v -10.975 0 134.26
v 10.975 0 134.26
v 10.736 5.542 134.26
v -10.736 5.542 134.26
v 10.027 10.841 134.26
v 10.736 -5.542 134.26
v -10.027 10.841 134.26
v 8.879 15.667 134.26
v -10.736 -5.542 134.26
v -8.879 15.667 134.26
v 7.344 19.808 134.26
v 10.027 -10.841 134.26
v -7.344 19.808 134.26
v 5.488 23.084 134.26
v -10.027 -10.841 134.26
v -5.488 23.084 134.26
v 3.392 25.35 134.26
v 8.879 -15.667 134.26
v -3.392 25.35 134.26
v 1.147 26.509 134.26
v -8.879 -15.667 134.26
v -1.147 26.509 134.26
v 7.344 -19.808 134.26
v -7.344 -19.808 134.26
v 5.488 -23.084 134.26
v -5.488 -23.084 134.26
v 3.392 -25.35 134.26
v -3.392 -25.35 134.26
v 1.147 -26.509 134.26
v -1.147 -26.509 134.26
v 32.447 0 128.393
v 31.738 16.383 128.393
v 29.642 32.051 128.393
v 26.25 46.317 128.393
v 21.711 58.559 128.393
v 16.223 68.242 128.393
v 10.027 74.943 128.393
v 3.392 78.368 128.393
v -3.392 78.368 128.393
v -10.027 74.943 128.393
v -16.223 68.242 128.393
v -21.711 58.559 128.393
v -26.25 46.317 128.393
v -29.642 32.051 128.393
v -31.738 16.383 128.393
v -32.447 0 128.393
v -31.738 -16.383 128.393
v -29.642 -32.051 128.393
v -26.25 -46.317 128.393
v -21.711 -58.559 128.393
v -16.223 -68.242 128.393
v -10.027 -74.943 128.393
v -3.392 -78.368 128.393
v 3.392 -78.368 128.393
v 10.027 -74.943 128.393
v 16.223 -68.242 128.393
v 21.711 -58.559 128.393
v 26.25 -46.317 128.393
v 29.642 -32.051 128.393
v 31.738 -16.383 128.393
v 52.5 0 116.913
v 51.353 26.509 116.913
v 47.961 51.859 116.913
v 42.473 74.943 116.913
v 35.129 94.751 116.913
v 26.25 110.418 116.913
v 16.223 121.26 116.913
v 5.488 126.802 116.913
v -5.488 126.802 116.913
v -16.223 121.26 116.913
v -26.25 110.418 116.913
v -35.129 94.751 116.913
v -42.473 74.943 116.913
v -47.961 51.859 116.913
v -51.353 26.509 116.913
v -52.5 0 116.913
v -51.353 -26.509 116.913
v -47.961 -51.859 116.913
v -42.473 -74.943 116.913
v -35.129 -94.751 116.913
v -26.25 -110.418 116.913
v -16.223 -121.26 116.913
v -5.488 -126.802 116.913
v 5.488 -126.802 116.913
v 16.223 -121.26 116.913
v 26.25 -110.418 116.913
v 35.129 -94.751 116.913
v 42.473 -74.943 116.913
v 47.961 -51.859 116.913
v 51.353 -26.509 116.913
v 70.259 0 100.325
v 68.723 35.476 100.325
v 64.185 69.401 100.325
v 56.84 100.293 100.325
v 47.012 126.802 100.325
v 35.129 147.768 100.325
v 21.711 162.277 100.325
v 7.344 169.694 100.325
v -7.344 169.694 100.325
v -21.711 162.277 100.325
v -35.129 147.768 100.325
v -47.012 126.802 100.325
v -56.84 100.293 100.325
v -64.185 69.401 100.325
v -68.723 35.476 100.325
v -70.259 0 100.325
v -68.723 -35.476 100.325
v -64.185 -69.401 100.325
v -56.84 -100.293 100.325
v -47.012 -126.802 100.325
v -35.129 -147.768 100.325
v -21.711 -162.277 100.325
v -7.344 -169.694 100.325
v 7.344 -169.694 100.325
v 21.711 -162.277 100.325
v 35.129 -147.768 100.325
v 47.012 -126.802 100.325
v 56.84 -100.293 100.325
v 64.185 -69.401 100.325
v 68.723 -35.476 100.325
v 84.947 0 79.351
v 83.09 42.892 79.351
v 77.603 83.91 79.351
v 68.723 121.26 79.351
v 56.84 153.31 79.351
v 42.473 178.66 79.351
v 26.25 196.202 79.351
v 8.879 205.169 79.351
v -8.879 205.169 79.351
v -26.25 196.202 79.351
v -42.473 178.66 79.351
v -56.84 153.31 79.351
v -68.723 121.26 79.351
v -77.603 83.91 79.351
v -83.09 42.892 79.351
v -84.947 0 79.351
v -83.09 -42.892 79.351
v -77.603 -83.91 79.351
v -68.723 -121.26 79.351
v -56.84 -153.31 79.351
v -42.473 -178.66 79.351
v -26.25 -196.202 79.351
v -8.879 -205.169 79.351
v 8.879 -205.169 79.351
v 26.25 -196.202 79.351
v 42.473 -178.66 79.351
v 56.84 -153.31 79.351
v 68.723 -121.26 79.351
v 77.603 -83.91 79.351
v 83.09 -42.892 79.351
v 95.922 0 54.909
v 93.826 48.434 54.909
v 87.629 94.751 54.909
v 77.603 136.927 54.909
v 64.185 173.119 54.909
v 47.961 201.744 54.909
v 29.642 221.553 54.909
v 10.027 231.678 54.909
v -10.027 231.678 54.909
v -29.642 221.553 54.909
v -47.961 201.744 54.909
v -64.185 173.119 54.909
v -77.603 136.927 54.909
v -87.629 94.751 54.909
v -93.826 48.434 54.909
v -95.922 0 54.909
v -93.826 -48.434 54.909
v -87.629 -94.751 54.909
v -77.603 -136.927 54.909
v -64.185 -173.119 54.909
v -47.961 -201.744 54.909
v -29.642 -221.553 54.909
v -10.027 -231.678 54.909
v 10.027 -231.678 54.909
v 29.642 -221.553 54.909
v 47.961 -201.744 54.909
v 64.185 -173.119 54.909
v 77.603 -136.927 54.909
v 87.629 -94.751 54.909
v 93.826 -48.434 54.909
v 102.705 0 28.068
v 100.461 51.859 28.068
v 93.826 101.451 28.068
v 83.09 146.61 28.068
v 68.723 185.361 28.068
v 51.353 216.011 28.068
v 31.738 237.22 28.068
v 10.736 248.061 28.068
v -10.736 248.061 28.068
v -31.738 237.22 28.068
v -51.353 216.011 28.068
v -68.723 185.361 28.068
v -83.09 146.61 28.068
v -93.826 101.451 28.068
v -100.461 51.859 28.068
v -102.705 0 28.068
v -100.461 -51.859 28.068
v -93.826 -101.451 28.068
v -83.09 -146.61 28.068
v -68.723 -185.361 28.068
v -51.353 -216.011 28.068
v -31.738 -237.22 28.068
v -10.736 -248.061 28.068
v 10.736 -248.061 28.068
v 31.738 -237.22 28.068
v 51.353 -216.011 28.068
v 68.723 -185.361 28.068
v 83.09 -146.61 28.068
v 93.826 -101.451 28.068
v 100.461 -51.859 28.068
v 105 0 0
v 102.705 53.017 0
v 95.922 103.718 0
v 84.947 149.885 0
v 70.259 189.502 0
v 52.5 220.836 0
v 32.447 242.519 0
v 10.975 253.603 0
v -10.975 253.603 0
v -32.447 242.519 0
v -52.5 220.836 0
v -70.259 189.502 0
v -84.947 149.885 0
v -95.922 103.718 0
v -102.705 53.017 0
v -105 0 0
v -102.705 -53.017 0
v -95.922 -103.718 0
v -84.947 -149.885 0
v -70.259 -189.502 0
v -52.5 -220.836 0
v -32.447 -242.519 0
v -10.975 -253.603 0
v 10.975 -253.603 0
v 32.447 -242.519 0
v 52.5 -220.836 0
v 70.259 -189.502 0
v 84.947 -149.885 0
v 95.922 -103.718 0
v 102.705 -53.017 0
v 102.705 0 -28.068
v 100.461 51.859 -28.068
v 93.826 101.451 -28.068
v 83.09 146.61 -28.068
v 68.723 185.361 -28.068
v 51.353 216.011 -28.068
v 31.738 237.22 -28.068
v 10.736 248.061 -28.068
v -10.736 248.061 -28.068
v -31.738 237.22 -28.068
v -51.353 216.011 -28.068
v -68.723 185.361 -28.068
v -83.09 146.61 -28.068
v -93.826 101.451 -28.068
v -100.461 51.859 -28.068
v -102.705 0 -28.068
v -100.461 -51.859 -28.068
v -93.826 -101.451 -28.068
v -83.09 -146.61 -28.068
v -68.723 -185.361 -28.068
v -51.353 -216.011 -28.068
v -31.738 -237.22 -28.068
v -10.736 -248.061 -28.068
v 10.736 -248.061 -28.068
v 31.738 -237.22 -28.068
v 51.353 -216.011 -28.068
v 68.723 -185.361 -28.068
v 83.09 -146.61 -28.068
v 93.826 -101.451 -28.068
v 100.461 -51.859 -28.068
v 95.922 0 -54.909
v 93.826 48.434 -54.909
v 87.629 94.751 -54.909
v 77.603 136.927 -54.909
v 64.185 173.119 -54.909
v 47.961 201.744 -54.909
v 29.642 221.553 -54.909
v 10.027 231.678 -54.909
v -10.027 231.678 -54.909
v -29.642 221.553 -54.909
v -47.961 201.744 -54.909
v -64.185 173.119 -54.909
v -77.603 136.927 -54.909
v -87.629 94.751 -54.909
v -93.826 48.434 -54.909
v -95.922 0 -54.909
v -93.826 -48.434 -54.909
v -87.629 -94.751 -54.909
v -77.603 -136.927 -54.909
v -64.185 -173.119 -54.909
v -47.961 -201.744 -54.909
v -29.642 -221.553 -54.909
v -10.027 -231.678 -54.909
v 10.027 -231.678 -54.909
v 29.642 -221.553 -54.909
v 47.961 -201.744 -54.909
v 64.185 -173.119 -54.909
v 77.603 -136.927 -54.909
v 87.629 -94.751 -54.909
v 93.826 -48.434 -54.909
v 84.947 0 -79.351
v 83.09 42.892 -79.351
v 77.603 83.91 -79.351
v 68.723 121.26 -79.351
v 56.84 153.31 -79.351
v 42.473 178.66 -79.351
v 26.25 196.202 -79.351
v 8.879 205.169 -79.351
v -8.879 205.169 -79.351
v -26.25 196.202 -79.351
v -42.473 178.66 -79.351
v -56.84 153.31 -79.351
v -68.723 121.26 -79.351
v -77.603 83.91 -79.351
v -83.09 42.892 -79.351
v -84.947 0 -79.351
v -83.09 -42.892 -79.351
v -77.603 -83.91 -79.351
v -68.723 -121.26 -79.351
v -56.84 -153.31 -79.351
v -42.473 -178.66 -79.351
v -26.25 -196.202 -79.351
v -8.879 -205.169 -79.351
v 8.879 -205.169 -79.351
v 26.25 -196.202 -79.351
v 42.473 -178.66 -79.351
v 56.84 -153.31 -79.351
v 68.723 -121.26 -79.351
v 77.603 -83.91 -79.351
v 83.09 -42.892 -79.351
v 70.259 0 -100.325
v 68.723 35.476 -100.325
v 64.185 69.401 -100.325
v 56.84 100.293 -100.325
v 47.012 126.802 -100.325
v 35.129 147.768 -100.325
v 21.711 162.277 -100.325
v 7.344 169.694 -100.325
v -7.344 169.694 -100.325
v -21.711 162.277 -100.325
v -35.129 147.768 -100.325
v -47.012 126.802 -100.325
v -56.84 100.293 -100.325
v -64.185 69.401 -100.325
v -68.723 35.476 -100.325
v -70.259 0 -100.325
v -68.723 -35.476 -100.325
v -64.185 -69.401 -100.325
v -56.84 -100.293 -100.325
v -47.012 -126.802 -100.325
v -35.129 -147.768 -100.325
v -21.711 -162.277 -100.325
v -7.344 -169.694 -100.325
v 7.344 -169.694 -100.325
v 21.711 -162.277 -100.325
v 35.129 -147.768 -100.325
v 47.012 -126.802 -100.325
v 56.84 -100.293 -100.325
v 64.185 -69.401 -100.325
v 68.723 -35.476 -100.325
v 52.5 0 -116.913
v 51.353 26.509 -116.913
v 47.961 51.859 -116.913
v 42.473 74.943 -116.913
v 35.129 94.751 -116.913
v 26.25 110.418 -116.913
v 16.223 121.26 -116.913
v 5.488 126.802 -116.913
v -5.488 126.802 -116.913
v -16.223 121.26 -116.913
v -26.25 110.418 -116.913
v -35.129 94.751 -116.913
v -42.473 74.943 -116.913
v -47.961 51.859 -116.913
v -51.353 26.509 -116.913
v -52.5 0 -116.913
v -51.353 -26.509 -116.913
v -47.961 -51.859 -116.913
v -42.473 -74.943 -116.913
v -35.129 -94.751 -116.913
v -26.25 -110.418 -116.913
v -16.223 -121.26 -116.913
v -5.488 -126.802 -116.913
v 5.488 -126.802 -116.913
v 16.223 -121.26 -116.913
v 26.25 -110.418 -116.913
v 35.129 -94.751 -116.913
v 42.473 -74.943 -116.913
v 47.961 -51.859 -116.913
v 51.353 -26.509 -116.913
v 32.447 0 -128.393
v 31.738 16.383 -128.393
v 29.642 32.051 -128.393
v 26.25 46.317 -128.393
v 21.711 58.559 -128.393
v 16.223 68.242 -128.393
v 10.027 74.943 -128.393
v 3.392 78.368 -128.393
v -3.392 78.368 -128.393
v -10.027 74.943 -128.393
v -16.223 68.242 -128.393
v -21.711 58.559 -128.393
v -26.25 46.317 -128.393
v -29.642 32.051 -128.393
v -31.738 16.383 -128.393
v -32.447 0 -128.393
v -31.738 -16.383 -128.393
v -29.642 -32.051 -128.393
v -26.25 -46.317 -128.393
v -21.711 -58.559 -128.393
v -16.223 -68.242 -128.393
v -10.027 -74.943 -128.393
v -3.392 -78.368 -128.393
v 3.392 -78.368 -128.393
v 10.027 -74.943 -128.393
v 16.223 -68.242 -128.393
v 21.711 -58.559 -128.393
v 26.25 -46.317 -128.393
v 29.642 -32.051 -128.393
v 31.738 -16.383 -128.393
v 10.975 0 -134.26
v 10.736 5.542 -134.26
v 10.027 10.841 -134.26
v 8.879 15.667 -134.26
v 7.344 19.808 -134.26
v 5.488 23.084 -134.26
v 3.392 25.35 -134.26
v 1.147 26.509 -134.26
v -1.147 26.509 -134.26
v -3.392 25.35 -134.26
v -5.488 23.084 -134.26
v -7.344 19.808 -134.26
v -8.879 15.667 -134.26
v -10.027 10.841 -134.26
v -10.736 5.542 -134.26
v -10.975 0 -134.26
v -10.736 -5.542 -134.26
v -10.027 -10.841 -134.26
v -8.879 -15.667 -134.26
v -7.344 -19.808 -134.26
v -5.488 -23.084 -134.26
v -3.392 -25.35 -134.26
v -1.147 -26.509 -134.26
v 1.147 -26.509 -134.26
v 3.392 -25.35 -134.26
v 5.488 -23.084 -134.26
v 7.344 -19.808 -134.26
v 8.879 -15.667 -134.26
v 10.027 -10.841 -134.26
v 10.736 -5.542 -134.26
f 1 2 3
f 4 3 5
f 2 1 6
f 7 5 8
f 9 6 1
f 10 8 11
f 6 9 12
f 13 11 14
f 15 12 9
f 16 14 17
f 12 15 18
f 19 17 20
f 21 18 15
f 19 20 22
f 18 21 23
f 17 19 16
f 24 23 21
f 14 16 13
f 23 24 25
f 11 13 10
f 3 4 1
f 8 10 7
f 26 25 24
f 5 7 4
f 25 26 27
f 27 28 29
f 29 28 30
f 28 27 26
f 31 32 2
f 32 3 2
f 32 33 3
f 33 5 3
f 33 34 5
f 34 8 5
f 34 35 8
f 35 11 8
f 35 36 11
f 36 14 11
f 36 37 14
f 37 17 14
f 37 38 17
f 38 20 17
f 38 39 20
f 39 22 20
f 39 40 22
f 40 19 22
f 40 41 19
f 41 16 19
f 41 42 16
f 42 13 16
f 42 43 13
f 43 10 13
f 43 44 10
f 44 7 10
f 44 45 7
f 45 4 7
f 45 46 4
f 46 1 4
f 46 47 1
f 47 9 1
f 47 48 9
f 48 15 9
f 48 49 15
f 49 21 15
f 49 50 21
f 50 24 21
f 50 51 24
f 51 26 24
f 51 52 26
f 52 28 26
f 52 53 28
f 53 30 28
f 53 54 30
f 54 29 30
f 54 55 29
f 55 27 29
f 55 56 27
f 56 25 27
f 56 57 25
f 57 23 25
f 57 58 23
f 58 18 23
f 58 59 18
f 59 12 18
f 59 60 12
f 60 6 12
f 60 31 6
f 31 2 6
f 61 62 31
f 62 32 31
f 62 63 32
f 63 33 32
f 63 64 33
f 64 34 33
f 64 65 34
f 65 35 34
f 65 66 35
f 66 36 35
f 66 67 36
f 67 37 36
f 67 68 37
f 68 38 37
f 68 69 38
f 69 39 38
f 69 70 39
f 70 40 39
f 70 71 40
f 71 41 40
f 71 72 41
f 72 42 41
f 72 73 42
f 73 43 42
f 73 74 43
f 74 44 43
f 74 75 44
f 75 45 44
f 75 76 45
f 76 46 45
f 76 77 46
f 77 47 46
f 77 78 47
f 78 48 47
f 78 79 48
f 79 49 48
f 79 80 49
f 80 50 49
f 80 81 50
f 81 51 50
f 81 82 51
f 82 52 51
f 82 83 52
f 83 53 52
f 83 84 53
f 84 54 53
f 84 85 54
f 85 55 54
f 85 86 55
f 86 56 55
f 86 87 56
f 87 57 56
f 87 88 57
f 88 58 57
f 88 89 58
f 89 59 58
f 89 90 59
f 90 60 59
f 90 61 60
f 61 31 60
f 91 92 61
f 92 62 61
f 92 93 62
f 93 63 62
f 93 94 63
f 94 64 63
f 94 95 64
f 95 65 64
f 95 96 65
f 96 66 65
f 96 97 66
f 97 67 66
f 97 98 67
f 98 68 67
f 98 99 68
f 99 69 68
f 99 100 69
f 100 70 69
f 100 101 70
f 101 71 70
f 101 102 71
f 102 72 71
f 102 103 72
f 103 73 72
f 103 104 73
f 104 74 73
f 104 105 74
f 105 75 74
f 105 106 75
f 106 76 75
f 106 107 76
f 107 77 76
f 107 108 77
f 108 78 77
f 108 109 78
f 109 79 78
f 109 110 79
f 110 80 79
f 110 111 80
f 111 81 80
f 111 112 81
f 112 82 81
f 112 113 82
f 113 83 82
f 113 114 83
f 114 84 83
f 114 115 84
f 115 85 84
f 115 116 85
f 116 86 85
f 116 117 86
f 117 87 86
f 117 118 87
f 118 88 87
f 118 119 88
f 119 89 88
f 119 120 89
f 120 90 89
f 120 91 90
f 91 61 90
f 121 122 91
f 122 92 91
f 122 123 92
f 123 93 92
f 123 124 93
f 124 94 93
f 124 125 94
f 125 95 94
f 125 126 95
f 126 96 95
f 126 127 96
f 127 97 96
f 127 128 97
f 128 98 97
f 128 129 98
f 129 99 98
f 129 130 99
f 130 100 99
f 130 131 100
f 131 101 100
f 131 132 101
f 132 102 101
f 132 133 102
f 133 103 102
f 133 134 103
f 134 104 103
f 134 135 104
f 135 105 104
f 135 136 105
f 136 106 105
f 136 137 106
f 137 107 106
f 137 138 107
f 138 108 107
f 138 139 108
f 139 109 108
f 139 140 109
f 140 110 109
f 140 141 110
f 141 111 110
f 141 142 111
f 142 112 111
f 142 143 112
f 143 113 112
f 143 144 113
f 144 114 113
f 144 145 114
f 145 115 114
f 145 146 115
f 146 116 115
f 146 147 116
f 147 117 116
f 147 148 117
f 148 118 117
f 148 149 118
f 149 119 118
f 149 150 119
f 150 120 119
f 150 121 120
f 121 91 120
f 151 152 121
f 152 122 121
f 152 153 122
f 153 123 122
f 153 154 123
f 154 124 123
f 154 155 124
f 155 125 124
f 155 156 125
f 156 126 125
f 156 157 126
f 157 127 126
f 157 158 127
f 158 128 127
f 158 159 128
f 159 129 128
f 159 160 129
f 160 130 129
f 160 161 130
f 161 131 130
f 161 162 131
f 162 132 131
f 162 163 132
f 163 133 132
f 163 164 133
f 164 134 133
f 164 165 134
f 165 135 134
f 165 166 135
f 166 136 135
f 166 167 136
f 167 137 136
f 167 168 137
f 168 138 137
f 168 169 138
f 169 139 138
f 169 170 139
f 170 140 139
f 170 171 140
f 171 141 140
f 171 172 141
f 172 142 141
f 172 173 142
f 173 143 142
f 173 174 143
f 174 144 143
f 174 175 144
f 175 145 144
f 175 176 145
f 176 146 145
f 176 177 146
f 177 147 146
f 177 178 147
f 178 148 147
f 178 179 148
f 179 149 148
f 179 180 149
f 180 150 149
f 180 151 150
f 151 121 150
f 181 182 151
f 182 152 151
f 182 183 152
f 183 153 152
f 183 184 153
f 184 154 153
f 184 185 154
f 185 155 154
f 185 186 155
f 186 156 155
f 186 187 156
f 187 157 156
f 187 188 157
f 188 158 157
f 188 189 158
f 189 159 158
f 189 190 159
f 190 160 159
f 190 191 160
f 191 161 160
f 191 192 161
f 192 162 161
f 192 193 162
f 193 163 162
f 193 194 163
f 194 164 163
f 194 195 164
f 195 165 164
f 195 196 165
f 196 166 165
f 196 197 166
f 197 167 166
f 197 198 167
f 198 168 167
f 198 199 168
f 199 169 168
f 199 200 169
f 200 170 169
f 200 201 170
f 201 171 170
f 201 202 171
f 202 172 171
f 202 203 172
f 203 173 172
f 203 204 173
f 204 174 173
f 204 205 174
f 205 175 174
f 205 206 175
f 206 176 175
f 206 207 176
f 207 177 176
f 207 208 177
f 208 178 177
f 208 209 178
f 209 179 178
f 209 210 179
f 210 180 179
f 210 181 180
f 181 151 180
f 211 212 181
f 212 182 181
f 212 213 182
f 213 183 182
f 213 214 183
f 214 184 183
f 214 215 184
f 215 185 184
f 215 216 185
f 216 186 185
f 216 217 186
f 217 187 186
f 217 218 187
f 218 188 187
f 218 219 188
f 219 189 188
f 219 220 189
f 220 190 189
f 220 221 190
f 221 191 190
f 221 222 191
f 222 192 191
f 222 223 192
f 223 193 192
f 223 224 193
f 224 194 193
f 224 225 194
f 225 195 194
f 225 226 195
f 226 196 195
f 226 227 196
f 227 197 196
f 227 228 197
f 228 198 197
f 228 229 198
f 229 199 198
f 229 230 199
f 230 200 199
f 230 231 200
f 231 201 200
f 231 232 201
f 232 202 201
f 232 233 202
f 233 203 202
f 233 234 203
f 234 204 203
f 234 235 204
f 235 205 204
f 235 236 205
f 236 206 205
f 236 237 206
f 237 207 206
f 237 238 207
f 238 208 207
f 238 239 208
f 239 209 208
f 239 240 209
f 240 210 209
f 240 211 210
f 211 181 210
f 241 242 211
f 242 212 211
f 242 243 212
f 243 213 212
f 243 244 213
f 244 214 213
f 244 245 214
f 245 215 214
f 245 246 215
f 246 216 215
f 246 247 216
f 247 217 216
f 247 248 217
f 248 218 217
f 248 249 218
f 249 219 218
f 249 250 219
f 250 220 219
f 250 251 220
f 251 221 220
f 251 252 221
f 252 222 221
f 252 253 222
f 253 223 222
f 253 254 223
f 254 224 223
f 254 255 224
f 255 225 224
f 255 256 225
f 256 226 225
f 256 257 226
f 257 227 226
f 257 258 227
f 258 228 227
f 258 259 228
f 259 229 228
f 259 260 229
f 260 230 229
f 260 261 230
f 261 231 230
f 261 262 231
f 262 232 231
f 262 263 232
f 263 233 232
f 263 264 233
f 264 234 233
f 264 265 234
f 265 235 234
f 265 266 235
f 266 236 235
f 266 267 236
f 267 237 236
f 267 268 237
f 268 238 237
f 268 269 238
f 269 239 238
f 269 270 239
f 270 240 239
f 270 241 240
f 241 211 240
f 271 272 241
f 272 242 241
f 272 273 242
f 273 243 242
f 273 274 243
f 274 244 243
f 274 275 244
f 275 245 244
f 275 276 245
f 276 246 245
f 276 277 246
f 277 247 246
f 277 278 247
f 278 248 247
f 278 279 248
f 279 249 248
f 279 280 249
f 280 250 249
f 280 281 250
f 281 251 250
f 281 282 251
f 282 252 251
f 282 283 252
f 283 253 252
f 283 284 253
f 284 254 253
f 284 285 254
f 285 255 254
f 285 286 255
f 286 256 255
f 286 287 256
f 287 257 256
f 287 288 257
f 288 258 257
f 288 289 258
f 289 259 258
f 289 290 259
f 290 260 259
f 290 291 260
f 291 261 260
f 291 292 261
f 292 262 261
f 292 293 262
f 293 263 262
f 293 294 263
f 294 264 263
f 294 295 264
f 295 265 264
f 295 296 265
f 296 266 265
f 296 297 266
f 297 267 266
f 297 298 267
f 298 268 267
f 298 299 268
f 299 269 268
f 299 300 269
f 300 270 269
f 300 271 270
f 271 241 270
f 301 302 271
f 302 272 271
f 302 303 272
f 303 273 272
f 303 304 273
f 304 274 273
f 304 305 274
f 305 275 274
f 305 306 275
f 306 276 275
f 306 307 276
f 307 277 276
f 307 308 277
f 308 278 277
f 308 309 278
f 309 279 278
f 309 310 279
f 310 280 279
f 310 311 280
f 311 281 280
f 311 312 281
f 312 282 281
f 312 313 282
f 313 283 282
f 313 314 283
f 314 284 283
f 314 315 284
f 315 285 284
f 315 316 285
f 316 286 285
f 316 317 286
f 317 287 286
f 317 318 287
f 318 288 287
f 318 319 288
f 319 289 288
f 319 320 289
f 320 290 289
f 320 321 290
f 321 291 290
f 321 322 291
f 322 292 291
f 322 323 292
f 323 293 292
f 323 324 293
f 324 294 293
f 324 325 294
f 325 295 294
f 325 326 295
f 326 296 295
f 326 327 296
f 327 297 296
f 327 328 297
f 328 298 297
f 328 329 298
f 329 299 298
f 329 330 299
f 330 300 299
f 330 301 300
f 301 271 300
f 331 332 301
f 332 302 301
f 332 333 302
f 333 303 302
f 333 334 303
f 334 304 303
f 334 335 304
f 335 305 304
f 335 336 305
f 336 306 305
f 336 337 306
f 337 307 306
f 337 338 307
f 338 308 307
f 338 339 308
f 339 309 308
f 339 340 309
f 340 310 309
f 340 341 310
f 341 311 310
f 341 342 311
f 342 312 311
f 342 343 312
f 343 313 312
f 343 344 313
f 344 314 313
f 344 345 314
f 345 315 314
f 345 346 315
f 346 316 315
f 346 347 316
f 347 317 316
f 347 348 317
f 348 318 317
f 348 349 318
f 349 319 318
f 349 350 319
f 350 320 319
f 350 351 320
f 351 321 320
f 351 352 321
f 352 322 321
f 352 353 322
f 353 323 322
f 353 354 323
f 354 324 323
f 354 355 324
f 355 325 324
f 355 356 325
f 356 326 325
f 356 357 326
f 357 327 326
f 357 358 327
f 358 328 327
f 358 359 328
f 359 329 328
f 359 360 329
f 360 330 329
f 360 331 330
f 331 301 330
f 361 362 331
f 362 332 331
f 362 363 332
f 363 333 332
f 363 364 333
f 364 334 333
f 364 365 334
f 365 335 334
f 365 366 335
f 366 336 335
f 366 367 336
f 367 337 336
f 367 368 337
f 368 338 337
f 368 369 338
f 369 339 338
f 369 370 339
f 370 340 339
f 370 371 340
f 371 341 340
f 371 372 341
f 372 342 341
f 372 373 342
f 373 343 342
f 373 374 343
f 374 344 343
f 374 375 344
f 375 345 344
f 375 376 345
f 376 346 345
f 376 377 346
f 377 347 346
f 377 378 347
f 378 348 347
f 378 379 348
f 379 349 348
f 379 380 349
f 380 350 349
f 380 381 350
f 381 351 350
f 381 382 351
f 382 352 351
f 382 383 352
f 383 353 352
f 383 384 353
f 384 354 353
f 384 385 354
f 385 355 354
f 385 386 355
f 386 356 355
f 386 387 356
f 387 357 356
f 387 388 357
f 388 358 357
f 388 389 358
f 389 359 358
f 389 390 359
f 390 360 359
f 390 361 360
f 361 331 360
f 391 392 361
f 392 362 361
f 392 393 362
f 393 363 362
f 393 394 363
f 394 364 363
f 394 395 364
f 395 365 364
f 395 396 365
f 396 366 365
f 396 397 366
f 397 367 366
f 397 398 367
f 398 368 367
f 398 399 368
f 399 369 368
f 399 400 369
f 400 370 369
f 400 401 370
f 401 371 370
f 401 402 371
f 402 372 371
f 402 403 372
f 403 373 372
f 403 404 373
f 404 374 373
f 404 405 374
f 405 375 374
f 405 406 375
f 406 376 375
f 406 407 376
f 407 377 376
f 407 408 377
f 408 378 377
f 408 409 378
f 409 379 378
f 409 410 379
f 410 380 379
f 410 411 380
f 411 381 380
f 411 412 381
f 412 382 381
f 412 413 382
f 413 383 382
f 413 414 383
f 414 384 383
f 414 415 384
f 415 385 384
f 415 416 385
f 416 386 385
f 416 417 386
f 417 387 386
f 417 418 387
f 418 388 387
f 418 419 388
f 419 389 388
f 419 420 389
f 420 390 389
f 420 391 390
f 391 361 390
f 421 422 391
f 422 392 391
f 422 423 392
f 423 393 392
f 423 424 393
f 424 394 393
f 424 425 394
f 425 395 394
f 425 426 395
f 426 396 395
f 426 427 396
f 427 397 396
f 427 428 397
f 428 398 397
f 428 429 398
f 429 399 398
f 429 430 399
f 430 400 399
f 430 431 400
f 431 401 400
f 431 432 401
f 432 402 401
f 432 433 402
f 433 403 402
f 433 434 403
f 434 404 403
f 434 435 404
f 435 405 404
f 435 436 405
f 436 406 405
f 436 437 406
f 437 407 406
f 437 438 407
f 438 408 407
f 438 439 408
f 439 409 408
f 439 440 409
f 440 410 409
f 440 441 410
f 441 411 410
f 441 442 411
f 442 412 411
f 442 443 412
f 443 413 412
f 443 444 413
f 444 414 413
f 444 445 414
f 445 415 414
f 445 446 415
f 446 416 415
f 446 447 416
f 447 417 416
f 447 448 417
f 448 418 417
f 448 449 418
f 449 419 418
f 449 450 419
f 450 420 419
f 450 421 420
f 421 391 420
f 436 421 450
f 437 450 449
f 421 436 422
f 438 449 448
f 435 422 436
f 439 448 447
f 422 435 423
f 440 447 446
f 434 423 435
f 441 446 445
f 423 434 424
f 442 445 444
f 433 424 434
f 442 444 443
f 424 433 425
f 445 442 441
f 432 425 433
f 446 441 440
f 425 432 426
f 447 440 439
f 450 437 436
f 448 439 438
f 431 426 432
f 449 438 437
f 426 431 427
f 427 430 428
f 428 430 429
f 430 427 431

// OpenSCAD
// Generated by SolidPython 1.0.1 on 2020-07-29 00:46:48


scale(v = [7, 17, 9]) {
	sphere(r = 15);
}
/***********************************************
*********      SolidPython code:      **********
************************************************
 
# import packages: SolidPython
from solid import *
from solid.utils import *
from itertools import chain, combinations, permutations


class Resize:

    def __init__(self, scad_file):
        self.scad_file = scad_file
        #self.scad_file = import_scad(scad_file)
        # cone/cylinder param:
        self.r1 = 0
        self.r2 = 0
        self.h = 0
        # rectangular prism param:
        self.w = 0
        self.l = 0
        # ellipse param:
        self.r = 0

    # import OpenScad code (file name corresponds to shape)


    # classify shape + parameters
    def assign(self, param1, param2, param3):
        if self.scad_file == 'cone.scad':
            self.r1 = param1
            self.r2 = param2
            self.h = param3
        elif self.scad_file == 'cylinder.scad':
            self.r1 = param1
            self.r2 = param2
            self.h = param3
        elif self.scad_file == 'rectangularPrism.scad':
            self.h = param1
            self.l = param2
            self.w = param3
        else:
            self.r = param1
            self.h = param2

    # resize parameters
    def iterate(self):
        x = range(3, 20, 2)
        i = 1
        if self.scad_file == 'cone.scad':
            tempList = list(permutations(x, 2))
            for temp in tempList:
                param1 = temp[0]
                param2 = temp[1]
                filepath = 'produced_scad_files/' + 'cone' + str(param1) + '_' + str(param2) + '_' + '.scad'
                scad_render_to_file(cylinder(h=param1, r1=param2, r2=0), filepath)

        elif self.scad_file == 'cylinder.scad':
            tempList = list(permutations(x, 3))
            for temp in tempList:
                param1 = temp[0]
                param2 = temp[1]
                filepath = 'produced_scad_files/' + 'cylinder' + str(param1) + '_' + str(param2) + '_' + '.scad'
                scad_render_to_file(cylinder(h=param1, r1=param2, r2=param2), filepath)

        elif self.scad_file == 'rectangularPrism.scad':
            tempList = list(permutations(x, 3))
            for temp in tempList:
                param1 = temp[0]
                param2 = temp[1]
                param3 = temp[2]
                filepath = 'produced_scad_files/' + 'rectangularPrism' + str(param1) + '_' + str(param2) + '_' + str(
                    param3) + '.scad'
                scad_render_to_file(cube(size=(param1, param2, param3)), filepath)

        elif self.scad_file == 'ellipse.scad':
            tempList = list(permutations(x, 4))
            for temp in tempList:
                param1 = temp[0]
                param2 = temp[1]
                param3 = temp[2]
                param4 = temp[3]
                filepath = 'produced_scad_files/' + 'ellipse' + str(param1) + '_' + str(param2) + '_' + str(param3) + '_' + str(param4) + '.scad'
                scad_render_to_file(scale([param1, param2, param3])(sphere(r=param4)), filepath)

    def render_to_scadfile(self):
        scad_render_to_file(scad, 'example.scad') 
 
************************************************/
